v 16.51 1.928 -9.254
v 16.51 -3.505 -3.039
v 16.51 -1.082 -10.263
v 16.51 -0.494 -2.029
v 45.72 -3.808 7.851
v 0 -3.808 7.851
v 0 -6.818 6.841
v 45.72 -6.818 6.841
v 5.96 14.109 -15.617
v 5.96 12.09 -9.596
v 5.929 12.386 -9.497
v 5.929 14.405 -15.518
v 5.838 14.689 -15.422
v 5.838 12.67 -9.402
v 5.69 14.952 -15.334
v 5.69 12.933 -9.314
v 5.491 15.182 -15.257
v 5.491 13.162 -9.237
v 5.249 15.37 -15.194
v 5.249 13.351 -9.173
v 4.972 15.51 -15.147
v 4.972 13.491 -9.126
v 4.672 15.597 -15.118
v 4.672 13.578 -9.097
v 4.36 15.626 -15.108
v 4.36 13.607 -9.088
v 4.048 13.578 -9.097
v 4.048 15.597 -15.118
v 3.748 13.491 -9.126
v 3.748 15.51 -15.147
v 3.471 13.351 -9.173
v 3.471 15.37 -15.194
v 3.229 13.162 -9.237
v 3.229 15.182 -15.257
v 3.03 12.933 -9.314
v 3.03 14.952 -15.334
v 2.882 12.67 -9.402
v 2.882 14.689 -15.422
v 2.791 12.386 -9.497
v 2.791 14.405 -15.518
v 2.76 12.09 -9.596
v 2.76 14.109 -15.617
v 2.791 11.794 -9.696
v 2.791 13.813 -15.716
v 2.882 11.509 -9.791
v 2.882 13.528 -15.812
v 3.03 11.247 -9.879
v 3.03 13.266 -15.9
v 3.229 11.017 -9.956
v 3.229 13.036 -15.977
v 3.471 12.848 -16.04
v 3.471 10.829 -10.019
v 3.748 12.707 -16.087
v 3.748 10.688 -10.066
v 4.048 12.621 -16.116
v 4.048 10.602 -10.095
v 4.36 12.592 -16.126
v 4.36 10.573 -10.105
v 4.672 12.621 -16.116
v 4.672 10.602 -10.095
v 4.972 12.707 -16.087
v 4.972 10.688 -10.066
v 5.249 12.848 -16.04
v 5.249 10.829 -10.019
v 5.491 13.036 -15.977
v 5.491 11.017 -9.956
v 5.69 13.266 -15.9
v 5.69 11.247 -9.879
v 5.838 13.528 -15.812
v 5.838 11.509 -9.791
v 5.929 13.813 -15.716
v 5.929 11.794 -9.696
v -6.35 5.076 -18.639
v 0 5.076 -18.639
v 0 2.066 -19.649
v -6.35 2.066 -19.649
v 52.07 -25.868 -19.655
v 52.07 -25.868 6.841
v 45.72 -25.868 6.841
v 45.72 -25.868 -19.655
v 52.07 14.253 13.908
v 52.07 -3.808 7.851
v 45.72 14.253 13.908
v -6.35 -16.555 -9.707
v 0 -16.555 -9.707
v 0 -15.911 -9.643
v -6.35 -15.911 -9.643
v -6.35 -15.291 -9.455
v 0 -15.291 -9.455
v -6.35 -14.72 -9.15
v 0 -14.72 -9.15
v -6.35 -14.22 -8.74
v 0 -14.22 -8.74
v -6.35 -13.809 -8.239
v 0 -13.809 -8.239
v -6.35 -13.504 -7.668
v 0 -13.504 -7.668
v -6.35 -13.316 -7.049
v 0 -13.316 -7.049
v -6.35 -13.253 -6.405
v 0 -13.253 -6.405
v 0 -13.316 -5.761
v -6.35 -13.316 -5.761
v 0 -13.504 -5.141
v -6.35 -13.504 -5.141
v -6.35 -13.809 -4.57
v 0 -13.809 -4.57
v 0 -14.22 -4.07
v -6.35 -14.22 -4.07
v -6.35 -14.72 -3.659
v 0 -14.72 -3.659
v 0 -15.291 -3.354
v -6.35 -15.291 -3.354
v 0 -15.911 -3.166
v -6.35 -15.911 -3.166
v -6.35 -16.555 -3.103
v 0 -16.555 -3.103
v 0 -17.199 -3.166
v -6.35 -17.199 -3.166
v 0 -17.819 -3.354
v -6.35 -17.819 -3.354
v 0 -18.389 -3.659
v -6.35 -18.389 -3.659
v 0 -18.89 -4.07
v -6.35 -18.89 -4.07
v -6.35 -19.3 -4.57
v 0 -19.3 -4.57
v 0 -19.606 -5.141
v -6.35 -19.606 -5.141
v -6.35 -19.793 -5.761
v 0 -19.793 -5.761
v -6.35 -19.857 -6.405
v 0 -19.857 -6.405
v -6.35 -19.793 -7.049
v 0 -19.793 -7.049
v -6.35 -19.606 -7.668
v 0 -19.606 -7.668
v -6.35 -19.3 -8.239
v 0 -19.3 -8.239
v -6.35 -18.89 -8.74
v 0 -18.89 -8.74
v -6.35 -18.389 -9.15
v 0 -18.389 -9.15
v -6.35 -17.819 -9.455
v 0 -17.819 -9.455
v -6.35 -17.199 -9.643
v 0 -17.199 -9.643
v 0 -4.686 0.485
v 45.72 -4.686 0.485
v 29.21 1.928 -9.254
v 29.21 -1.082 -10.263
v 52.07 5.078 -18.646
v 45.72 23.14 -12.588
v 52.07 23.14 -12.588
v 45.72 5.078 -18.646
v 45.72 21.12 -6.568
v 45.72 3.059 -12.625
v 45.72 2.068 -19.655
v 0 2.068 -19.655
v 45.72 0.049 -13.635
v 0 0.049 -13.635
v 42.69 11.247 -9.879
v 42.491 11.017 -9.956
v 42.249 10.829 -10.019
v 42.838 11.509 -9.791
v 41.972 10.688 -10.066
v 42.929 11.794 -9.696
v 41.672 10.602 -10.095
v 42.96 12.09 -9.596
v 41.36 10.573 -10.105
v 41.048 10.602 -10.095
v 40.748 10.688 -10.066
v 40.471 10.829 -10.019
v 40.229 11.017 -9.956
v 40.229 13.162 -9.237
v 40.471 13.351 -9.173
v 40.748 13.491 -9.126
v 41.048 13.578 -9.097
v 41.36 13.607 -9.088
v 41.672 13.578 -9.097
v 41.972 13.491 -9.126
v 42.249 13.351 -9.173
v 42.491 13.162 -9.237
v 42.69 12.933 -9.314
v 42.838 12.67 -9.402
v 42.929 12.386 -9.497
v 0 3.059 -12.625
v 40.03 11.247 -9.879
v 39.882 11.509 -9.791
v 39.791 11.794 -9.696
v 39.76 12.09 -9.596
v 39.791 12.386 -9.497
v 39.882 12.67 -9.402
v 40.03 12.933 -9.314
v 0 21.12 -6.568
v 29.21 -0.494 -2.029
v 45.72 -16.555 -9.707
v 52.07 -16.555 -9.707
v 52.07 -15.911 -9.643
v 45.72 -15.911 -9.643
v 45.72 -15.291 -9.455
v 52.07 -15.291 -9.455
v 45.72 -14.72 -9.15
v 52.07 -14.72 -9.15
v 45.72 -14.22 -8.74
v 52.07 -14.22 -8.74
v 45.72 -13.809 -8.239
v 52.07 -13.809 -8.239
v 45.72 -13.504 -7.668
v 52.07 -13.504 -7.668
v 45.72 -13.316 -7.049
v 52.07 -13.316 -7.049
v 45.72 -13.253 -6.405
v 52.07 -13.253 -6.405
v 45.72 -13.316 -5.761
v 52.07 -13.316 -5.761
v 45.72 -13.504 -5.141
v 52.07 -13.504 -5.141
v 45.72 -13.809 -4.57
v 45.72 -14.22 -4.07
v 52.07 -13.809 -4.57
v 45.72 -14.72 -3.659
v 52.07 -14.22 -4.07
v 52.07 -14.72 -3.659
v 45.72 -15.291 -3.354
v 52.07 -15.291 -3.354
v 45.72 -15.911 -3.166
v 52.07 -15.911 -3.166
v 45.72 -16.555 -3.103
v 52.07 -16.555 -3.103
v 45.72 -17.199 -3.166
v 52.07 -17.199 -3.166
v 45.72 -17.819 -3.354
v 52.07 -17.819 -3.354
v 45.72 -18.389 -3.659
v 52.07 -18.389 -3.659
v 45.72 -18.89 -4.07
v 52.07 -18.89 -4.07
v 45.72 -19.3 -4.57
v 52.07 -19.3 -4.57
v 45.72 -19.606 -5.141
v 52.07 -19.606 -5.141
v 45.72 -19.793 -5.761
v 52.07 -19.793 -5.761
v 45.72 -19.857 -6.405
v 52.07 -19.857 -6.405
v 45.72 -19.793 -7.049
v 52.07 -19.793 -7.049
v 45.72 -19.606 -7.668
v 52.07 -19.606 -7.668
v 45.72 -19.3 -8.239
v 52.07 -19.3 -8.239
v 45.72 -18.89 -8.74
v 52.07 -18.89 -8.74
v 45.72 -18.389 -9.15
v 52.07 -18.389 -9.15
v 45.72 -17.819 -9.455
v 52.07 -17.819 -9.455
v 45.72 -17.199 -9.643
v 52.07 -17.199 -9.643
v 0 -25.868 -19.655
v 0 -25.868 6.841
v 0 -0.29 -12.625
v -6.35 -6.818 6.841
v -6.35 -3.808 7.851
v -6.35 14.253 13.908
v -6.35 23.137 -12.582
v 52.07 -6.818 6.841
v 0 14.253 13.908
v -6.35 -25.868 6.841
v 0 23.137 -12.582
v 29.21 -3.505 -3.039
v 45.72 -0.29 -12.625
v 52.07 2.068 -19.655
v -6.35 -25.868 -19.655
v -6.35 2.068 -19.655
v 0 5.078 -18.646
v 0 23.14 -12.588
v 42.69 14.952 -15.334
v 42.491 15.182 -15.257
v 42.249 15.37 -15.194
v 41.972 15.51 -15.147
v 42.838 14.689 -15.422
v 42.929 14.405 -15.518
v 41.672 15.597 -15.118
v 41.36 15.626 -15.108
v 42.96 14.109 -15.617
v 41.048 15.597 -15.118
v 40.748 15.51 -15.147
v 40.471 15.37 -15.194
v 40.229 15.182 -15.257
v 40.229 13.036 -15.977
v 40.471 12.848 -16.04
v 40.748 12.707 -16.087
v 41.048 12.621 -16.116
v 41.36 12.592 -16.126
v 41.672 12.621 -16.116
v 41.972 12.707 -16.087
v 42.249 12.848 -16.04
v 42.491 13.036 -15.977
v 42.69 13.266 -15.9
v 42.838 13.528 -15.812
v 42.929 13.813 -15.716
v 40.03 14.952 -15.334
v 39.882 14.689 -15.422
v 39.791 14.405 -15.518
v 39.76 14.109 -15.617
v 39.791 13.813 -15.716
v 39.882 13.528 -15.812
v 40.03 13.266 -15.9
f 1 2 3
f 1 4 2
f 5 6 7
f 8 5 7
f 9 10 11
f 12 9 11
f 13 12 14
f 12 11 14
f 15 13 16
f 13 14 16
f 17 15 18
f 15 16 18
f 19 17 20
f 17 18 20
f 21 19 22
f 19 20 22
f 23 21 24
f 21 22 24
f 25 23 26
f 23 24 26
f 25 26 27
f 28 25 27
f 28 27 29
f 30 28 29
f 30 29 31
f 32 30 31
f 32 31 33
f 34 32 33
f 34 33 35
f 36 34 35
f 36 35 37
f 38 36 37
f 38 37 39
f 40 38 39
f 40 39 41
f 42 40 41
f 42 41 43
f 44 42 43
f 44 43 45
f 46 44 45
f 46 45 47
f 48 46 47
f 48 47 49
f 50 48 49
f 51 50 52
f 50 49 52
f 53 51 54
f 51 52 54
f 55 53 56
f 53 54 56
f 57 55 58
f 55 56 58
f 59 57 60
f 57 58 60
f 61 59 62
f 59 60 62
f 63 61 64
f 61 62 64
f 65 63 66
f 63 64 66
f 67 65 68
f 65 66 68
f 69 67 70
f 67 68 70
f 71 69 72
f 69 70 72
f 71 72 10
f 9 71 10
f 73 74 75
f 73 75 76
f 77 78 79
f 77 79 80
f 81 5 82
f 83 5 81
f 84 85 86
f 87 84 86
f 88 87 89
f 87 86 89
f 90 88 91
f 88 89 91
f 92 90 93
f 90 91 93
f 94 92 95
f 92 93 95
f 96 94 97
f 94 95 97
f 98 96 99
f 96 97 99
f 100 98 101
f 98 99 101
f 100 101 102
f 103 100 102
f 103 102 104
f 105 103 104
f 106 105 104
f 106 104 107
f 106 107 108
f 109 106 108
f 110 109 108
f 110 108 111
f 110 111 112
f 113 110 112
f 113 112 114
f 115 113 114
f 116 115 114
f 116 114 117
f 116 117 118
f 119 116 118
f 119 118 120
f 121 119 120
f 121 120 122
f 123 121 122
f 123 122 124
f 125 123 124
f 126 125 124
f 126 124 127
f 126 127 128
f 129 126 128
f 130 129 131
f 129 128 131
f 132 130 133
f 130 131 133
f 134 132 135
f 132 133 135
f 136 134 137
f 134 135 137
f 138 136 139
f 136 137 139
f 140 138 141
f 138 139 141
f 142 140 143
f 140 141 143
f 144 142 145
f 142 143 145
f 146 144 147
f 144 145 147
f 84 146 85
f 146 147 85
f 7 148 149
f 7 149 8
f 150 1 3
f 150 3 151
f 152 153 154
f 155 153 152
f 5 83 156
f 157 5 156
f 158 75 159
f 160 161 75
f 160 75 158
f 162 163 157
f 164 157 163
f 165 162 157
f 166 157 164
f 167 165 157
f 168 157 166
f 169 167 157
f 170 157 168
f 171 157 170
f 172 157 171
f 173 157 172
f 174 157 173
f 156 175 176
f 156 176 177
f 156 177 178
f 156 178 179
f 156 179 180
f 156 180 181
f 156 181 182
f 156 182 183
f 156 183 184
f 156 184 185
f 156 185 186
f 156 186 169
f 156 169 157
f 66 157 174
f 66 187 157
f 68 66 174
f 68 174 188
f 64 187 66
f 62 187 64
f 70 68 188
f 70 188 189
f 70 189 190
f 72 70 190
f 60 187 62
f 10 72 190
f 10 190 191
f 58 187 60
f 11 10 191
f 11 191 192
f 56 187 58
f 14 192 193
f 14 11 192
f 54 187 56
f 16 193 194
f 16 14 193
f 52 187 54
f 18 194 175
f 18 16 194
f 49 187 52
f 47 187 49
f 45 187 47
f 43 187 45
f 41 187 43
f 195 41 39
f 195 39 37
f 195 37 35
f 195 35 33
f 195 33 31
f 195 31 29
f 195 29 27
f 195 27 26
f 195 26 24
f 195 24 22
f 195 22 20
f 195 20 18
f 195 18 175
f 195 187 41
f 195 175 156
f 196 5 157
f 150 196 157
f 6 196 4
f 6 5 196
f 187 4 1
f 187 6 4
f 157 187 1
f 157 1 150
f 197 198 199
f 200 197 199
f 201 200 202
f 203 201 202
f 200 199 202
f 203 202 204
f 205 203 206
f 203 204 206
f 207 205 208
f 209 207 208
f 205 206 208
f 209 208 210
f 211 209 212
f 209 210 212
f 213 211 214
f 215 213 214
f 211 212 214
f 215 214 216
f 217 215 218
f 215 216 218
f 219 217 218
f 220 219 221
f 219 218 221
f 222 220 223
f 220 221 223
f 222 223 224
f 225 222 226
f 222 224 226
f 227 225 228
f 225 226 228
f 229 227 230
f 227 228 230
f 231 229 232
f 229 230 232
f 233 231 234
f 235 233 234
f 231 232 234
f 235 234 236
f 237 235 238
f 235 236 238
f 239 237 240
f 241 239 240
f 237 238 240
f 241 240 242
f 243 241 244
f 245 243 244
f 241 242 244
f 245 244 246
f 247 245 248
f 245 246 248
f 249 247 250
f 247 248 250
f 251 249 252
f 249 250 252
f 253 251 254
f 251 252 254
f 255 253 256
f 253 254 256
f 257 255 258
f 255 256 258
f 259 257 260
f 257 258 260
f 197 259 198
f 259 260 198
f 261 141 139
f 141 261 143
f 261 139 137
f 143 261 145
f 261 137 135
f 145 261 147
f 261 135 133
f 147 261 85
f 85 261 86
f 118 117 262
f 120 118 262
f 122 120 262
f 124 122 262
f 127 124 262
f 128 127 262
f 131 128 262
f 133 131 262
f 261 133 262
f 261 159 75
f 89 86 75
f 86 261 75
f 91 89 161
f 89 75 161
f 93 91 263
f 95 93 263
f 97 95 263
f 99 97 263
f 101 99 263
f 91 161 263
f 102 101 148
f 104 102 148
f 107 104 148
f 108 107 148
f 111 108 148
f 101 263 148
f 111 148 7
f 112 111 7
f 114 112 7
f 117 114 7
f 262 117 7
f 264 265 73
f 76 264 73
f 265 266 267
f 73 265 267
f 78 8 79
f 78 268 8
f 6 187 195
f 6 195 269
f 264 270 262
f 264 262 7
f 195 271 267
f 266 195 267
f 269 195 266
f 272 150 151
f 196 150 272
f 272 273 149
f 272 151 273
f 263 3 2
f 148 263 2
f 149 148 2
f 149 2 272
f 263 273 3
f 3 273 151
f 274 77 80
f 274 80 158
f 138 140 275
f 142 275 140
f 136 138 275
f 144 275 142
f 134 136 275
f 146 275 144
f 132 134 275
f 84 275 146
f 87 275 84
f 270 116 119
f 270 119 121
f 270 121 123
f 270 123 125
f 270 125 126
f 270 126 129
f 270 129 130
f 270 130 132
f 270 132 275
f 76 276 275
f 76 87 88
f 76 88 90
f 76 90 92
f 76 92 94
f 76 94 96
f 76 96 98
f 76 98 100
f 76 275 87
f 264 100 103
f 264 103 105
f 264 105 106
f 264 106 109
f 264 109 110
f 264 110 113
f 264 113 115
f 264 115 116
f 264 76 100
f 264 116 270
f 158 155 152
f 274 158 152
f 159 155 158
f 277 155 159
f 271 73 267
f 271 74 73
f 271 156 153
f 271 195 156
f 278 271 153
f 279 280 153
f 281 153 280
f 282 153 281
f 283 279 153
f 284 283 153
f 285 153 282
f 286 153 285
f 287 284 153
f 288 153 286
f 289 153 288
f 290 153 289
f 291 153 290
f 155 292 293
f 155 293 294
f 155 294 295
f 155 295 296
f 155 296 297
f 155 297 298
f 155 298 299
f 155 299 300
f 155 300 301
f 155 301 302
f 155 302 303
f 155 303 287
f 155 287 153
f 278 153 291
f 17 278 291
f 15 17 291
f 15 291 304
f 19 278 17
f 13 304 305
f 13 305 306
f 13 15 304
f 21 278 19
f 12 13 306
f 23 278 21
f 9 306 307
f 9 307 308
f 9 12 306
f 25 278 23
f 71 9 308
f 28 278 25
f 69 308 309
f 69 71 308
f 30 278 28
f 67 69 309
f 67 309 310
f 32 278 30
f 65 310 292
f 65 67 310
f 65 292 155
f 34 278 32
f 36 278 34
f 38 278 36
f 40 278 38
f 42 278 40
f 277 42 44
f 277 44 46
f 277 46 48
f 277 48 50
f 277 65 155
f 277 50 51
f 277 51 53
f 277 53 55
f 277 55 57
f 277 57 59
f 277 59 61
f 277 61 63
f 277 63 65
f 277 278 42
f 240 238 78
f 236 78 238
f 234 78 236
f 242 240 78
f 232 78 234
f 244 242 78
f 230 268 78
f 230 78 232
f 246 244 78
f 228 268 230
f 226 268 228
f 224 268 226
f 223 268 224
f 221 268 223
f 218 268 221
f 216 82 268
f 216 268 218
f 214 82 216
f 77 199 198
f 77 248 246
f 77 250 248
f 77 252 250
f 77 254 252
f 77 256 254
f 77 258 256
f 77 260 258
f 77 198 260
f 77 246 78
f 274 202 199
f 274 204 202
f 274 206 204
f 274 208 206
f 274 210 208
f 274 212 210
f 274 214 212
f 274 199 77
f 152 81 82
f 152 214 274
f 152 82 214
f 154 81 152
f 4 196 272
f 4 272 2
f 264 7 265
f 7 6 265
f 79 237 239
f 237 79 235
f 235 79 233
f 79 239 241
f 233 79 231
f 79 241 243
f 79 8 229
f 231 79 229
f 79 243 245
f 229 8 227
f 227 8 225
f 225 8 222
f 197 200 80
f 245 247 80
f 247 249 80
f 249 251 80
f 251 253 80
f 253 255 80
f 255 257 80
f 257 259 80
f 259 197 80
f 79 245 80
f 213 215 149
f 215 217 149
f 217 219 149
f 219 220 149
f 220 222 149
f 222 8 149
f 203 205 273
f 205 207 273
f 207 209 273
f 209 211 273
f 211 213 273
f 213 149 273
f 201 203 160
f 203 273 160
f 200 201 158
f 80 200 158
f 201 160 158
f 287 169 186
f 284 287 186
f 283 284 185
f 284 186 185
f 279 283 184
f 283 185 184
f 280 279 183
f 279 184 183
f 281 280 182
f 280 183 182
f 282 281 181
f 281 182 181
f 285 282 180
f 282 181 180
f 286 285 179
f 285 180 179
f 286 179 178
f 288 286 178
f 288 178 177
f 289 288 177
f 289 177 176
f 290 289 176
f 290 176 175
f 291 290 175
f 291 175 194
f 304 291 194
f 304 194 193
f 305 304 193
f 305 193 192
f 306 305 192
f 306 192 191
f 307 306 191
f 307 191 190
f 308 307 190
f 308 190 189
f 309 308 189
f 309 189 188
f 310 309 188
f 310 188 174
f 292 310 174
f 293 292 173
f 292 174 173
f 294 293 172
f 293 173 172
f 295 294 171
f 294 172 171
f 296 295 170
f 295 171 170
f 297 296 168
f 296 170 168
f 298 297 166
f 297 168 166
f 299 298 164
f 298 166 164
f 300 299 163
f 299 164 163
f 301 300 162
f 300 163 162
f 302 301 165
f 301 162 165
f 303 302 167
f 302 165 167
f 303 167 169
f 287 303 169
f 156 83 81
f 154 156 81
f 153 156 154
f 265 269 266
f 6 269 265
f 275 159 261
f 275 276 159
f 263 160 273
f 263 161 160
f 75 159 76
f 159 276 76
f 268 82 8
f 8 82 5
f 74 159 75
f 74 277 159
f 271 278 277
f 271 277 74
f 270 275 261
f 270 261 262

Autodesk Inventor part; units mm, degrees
ref_plane "YZ Plane" through (0, 0, 0) normal (1, 0, 0) x (0, 1, 0)
ref_plane "XZ Plane" through (0, 0, 0) normal (0, 1, 0) x (-1, 0, 0)
sketch "Sketch8" plane through (0, 0, 0) normal (1, 0, 0) x (0, 1, 0)
  line L0 (-3.8078, 7.851) -> (3.0591, -12.6251)
  line L1 (-0.2897, -12.6251) -> (-4.6863, 0.485)
  line L2 (3.0591, -12.6251) -> (-0.2897, -12.6251)
  line L3 (-4.6863, 0.485) -> (-6.818, 6.8414)
  line L4 (-3.8078, 7.851) -> (-6.818, 6.8414)
  point P0 (0, 0)
  dimension "d149" = 21.5968
  dimension "d150" = 3.175
  dimension "d151" = 3.3488
extrude "Extrusion6" add sketch "Sketch8" along normal blind 45.72
sketch "Sketch11" plane through (0, 0, 0) normal (-1, 0, 0) x (0, 0, 1)
  line L0 (0.485, -4.6863) -> (-12.6251, -0.2897) projected
  line L1 (6.8422, -6.8159) -> (6.835, -6.8159)
  line L2 (-12.6251, -0.2897) -> (0.485, -4.6863)
  line L3 (7.851, -3.8078) -> (-12.6251, 3.0591) projected
  line L4 (13.9082, 14.2533) -> (7.851, -3.808)
  line L5 (7.851, -3.808) -> (-18.639, 5.076)
  line L6 (-18.639, 5.076) -> (-12.5817, 23.1373)
  line L7 (-12.5817, 23.1373) -> (13.9082, 14.2533)
  line L8 (-12.6251, -0.2897) -> (6.8414, -6.818) projected
  line L9 (6.8414, -6.818) -> (7.851, -3.8078) projected
  point P0 (0, 0)
  dimension "d73" = 27.94
  dimension "d76" = 0
  dimension "d88" = 19.05
extrude "Extrusion8" add sketch "Sketch11" along normal blind 6.35 contours L3 L5 L6 L7 L4
sketch "Sketch13" plane through (0, -3.8078, 7.851) normal (0, 0.9481042, 0.3179598) x (1, 0, 0)
  line L0 (0, 0) -> (0, 21.5968) projected
  line L1 (16.51, 18.0408) -> (29.21, 18.0408)
  line L2 (29.21, 18.0408) -> (29.21, 10.4208)
  line L3 (29.21, 10.4208) -> (16.51, 10.4208)
  line L4 (16.51, 10.4208) -> (16.51, 18.0408)
  point P0 (0, 8.6543)
  dimension "d55" = 7.62
  dimension "d56" = 12.7
  dimension "d57" = 16.51
extrude "Extrusion10" cut sketch "Sketch13" against normal blind 25.4
sketch "Sketch15" plane through (0, 0, 0) normal (1, 0, 0) x (0, 0, -1)
  line L0 (6.5678, 21.1205) -> (12.5883, 23.1395)
  line L1 (12.5883, 23.1395) -> (18.6455, 5.0782)
  line L2 (18.6455, 5.0782) -> (12.6251, 3.0591)
  line L3 (12.6251, 3.0591) -> (6.5678, 21.1205)
  dimension "d67" = 6.35
  dimension "d69" = 0
  dimension "d70" = 0
  dimension "d87" = 19.05
extrude "Extrusion11" add sketch "Sketch15" along normal blind 45.72
sketch "Sketch17" plane through (45.72, 0, 0) normal (1, 0, 0) x (0, 0, -1)
  line L0 (-7.851, -3.808) -> (-13.9082, 14.2533) projected
  line L1 (-7.851, -3.808) -> (-13.9082, 14.2533)
  line L2 (-13.9082, 14.2533) -> (12.5883, 23.1395)
  line L3 (12.5883, 23.1395) -> (18.6456, 5.0782)
  line L4 (18.6456, 5.0782) -> (-7.851, -3.808)
  point P0 (0, 0)
extrude "Extrusion12" add sketch "Sketch17" along normal blind 6.35
sketch "Sketch19" plane through (45.72, 5.0782, -18.6456) normal (0, -0.9481019, -0.3179666) x (1, 0, 0)
  line L0 (0, 6.3501) -> (0, 0.0001) projected
  line L1 (6.35, 27.947) -> (0, 27.947)
  line L2 (0, 27.947) -> (0, 0.0001)
  line L3 (0, 0.0001) -> (6.35, 0.0001)
  line L4 (6.35, 0.0001) -> (6.35, 27.947)
  line L5 (-45.72, 6.3501) -> (0, 6.3501) projected
  line L6 (0, 0.0001) -> (0, 0.0001)
  line L7 (0, 0.0001) -> (0, 6.3501)
  line L8 (0, 6.3501) -> (0, 6.3501)
  line L9 (0, 6.3501) -> (0, 0.0001)
  line L10 (-45.72, 0.007) -> (-52.07, 0.007) projected
  line L11 (-52.07, 0.007) -> (-45.72, 0.007)
  line L12 (-45.72, 0.007) -> (-45.72, 27.947)
  line L13 (-45.72, 27.947) -> (-52.07, 27.947)
  line L14 (-52.07, 27.947) -> (-52.07, 0.007)
  point P0 (-45.72, 19.2926)
extrude "Extrusion13" add sketch "Sketch19" along normal blind 3.175
sketch "Sketch20" plane through (0, 5.0782, -18.6455) normal (0, -0.9481019, -0.3179666) x (1, 0, 0)
  line L0 (45.72, 0) -> (0, 0)
  line L1 (0, 0) -> (0, 6.35)
  line L2 (0, 6.35) -> (45.72, 6.35)
  line L3 (45.72, 6.35) -> (45.72, 0)
  point P0 (0, 19.2926)
extrude "Extrusion14" add sketch "Sketch20" along normal blind 3.175
sketch "Sketch21" plane through (0, 0, 0) normal (1, 0, 0) x (0, 0, -1)
  line L0 (19.6485, 2.0658) -> (13.6346, 0.0489) projected
  line L1 (13.6346, 0.0489) -> (12.6251, 3.0591) projected
  line L2 (12.6251, 3.0591) -> (12.6251, -0.2897) projected
  line L3 (12.6251, -0.2897) -> (-6.8414, -6.818) projected
  line L4 (-0.485, -4.6863) -> (-0.485, -4.6865) projected
  line L5 (19.6485, 2.0657) -> (-6.8414, -6.8182) projected
  line L6 (19.6485, 2.0657) -> (19.6485, 2.0658) projected
  line L7 (12.6251, 3.0591) -> (13.6346, 0.0489)
  line L8 (12.6251, -0.2897) -> (13.6346, 0.0489)
  line L9 (12.6251, 3.0591) -> (12.6251, -0.2897)
  point P0 (0, 0)
  point P1 (-6.8415, -6.8181)
extrude "Extrusion15" add sketch "Sketch21" along normal blind 45.72
sketch "Sketch22" plane through (16.51, -1.0818, -10.2631) normal (0, 0.9481042, 0.3179598) x (1, 0, 0)
  line L0 (12.7, -7.62) -> (12.7, 0) projected
  line L1 (12.7, 0) -> (0, 0) projected
  line L2 (0, 0) -> (12.7, 0)
  line L3 (12.7, 0) -> (12.7, -7.62)
  line L4 (12.7, -7.62) -> (0, -7.62)
  line L5 (0, -7.62) -> (0, 0)
  point P0 (-16.51, -9.3866)
extrude "Extrusion16" cut sketch "Sketch22" against normal blind 45.72
ref_plane "Work Plane1" through (0, -6.818, 6.8414) normal (0, -1, 0) x (1, 0, 0)
sketch "Sketch31" plane through (0, 21.1205, -6.5678) normal (0, -0.3179666, 0.9481019) x (1, 0, 0)
  line L0 (0, -19.05) -> (45.72, -19.05) projected
  line L1 (8.11, -16.025) -> (37.61, -16.025)
  line L2 (37.61, -16.025) -> (37.61, -13.275)
  line L3 (37.61, -13.275) -> (41.36, -13.275)
  arc A0 (41.36, -13.275) -> (41.36, -5.775) centre (41.36, -9.525) ccw
  line L4 (41.36, -5.775) -> (37.61, -5.775)
  line L5 (37.61, -5.775) -> (37.61, -3.025)
  line L6 (37.61, -3.025) -> (8.11, -3.025)
  line L7 (8.11, -3.025) -> (8.11, -5.775)
  line L8 (8.11, -5.775) -> (4.36, -5.775)
  arc A1 (4.36, -5.775) -> (4.36, -13.275) centre (4.36, -9.525) ccw
  line L9 (4.36, -13.275) -> (8.11, -13.275)
  line L10 (8.11, -13.275) -> (8.11, -16.025)
  circle A2 centre (41.36, -9.525) radius 1.6
  circle A3 centre (4.36, -9.525) radius 1.6
  line L11 (22.86, -3.025) -> (22.86, -16.025)
  line L12 (0, 0) -> (45.72, 0) projected
  line L13 (22.86, 0) -> (22.86, -19.05)
  line L14 (4.36, -9.525) -> (41.36, -9.525)
  line L15 (0, -22.225) -> (0, 0) projected
  line L16 (45.72, -19.05) -> (45.72, 0) projected
  line L17 (0, -9.525) -> (45.72, -9.525)
  point P0 (0, -17.936)
  point P1 (22.86, -9.525)
  point P2 (22.86, -9.525)
  dimension "d132" = 9.525
extrude "Extrusion24" cut sketch "Sketch31" against normal through all contours L17 L14 A3 | A3 L14 L17 | L14 L17 A2 | A2 L17 L14
sketch "Sketch32" plane through (52.07, 0, 0) normal (1, 0, 0) x (0, 0, -1)
  line L0 (19.6551, 2.0679) -> (-6.8414, -6.8182) projected
  line L1 (-6.8414, -6.8182) -> (-6.8414, -25.8682)
  line L2 (-6.8414, -25.8682) -> (19.6551, -25.8682)
  line L3 (19.6551, -25.8682) -> (19.6551, 2.0679)
  point P0 (0, 0)
  dimension "d139" = 19.05
extrude "Extrusion25" add sketch "Sketch32" against normal up to surface (6.35 mm away)
sketch "Sketch33" plane through (-6.35, 0, 0) normal (-1, 0, 0) x (0, 0, 1)
  line L0 (6.8414, -25.8682) -> (6.8414, -6.8182) projected
  line L1 (-19.6551, -25.8682) -> (6.8414, -25.8682) projected
  line L2 (-19.6551, 2.0679) -> (-19.6551, -25.8682) projected
  line L3 (13.9082, 14.2533) -> (6.8414, -6.8182) projected
  line L4 (-19.6551, 2.0679) -> (6.8414, -6.8182)
  point P0 (0, 0)
extrude "Extrusion26" add sketch "Sketch33" against normal up to surface (6.35 mm away)
sketch "Sketch34" plane through (52.07, 0, 0) normal (1, 0, 0) x (0, 0, -1)
  line L0 (-6.8414, -25.8682) -> (-6.8414, -6.8182) projected
  line L1 (19.6551, -25.8682) -> (-6.8414, -25.8682) projected
  circle A0 centre (6.4047, -16.5549) radius 3.302
  point P0 (0, 0)
  dimension "d144" = 6.604
  dimension "d145" = 9.3133
  dimension "d146" = 13.2461
extrude "Extrusion27" cut sketch "Sketch34" against normal up to surface (58.42 mm away)
equation "\"d57\" = d58"
equation "\"d58\" = 16.51"
properties part number "Lidar Sensor Case v3"
